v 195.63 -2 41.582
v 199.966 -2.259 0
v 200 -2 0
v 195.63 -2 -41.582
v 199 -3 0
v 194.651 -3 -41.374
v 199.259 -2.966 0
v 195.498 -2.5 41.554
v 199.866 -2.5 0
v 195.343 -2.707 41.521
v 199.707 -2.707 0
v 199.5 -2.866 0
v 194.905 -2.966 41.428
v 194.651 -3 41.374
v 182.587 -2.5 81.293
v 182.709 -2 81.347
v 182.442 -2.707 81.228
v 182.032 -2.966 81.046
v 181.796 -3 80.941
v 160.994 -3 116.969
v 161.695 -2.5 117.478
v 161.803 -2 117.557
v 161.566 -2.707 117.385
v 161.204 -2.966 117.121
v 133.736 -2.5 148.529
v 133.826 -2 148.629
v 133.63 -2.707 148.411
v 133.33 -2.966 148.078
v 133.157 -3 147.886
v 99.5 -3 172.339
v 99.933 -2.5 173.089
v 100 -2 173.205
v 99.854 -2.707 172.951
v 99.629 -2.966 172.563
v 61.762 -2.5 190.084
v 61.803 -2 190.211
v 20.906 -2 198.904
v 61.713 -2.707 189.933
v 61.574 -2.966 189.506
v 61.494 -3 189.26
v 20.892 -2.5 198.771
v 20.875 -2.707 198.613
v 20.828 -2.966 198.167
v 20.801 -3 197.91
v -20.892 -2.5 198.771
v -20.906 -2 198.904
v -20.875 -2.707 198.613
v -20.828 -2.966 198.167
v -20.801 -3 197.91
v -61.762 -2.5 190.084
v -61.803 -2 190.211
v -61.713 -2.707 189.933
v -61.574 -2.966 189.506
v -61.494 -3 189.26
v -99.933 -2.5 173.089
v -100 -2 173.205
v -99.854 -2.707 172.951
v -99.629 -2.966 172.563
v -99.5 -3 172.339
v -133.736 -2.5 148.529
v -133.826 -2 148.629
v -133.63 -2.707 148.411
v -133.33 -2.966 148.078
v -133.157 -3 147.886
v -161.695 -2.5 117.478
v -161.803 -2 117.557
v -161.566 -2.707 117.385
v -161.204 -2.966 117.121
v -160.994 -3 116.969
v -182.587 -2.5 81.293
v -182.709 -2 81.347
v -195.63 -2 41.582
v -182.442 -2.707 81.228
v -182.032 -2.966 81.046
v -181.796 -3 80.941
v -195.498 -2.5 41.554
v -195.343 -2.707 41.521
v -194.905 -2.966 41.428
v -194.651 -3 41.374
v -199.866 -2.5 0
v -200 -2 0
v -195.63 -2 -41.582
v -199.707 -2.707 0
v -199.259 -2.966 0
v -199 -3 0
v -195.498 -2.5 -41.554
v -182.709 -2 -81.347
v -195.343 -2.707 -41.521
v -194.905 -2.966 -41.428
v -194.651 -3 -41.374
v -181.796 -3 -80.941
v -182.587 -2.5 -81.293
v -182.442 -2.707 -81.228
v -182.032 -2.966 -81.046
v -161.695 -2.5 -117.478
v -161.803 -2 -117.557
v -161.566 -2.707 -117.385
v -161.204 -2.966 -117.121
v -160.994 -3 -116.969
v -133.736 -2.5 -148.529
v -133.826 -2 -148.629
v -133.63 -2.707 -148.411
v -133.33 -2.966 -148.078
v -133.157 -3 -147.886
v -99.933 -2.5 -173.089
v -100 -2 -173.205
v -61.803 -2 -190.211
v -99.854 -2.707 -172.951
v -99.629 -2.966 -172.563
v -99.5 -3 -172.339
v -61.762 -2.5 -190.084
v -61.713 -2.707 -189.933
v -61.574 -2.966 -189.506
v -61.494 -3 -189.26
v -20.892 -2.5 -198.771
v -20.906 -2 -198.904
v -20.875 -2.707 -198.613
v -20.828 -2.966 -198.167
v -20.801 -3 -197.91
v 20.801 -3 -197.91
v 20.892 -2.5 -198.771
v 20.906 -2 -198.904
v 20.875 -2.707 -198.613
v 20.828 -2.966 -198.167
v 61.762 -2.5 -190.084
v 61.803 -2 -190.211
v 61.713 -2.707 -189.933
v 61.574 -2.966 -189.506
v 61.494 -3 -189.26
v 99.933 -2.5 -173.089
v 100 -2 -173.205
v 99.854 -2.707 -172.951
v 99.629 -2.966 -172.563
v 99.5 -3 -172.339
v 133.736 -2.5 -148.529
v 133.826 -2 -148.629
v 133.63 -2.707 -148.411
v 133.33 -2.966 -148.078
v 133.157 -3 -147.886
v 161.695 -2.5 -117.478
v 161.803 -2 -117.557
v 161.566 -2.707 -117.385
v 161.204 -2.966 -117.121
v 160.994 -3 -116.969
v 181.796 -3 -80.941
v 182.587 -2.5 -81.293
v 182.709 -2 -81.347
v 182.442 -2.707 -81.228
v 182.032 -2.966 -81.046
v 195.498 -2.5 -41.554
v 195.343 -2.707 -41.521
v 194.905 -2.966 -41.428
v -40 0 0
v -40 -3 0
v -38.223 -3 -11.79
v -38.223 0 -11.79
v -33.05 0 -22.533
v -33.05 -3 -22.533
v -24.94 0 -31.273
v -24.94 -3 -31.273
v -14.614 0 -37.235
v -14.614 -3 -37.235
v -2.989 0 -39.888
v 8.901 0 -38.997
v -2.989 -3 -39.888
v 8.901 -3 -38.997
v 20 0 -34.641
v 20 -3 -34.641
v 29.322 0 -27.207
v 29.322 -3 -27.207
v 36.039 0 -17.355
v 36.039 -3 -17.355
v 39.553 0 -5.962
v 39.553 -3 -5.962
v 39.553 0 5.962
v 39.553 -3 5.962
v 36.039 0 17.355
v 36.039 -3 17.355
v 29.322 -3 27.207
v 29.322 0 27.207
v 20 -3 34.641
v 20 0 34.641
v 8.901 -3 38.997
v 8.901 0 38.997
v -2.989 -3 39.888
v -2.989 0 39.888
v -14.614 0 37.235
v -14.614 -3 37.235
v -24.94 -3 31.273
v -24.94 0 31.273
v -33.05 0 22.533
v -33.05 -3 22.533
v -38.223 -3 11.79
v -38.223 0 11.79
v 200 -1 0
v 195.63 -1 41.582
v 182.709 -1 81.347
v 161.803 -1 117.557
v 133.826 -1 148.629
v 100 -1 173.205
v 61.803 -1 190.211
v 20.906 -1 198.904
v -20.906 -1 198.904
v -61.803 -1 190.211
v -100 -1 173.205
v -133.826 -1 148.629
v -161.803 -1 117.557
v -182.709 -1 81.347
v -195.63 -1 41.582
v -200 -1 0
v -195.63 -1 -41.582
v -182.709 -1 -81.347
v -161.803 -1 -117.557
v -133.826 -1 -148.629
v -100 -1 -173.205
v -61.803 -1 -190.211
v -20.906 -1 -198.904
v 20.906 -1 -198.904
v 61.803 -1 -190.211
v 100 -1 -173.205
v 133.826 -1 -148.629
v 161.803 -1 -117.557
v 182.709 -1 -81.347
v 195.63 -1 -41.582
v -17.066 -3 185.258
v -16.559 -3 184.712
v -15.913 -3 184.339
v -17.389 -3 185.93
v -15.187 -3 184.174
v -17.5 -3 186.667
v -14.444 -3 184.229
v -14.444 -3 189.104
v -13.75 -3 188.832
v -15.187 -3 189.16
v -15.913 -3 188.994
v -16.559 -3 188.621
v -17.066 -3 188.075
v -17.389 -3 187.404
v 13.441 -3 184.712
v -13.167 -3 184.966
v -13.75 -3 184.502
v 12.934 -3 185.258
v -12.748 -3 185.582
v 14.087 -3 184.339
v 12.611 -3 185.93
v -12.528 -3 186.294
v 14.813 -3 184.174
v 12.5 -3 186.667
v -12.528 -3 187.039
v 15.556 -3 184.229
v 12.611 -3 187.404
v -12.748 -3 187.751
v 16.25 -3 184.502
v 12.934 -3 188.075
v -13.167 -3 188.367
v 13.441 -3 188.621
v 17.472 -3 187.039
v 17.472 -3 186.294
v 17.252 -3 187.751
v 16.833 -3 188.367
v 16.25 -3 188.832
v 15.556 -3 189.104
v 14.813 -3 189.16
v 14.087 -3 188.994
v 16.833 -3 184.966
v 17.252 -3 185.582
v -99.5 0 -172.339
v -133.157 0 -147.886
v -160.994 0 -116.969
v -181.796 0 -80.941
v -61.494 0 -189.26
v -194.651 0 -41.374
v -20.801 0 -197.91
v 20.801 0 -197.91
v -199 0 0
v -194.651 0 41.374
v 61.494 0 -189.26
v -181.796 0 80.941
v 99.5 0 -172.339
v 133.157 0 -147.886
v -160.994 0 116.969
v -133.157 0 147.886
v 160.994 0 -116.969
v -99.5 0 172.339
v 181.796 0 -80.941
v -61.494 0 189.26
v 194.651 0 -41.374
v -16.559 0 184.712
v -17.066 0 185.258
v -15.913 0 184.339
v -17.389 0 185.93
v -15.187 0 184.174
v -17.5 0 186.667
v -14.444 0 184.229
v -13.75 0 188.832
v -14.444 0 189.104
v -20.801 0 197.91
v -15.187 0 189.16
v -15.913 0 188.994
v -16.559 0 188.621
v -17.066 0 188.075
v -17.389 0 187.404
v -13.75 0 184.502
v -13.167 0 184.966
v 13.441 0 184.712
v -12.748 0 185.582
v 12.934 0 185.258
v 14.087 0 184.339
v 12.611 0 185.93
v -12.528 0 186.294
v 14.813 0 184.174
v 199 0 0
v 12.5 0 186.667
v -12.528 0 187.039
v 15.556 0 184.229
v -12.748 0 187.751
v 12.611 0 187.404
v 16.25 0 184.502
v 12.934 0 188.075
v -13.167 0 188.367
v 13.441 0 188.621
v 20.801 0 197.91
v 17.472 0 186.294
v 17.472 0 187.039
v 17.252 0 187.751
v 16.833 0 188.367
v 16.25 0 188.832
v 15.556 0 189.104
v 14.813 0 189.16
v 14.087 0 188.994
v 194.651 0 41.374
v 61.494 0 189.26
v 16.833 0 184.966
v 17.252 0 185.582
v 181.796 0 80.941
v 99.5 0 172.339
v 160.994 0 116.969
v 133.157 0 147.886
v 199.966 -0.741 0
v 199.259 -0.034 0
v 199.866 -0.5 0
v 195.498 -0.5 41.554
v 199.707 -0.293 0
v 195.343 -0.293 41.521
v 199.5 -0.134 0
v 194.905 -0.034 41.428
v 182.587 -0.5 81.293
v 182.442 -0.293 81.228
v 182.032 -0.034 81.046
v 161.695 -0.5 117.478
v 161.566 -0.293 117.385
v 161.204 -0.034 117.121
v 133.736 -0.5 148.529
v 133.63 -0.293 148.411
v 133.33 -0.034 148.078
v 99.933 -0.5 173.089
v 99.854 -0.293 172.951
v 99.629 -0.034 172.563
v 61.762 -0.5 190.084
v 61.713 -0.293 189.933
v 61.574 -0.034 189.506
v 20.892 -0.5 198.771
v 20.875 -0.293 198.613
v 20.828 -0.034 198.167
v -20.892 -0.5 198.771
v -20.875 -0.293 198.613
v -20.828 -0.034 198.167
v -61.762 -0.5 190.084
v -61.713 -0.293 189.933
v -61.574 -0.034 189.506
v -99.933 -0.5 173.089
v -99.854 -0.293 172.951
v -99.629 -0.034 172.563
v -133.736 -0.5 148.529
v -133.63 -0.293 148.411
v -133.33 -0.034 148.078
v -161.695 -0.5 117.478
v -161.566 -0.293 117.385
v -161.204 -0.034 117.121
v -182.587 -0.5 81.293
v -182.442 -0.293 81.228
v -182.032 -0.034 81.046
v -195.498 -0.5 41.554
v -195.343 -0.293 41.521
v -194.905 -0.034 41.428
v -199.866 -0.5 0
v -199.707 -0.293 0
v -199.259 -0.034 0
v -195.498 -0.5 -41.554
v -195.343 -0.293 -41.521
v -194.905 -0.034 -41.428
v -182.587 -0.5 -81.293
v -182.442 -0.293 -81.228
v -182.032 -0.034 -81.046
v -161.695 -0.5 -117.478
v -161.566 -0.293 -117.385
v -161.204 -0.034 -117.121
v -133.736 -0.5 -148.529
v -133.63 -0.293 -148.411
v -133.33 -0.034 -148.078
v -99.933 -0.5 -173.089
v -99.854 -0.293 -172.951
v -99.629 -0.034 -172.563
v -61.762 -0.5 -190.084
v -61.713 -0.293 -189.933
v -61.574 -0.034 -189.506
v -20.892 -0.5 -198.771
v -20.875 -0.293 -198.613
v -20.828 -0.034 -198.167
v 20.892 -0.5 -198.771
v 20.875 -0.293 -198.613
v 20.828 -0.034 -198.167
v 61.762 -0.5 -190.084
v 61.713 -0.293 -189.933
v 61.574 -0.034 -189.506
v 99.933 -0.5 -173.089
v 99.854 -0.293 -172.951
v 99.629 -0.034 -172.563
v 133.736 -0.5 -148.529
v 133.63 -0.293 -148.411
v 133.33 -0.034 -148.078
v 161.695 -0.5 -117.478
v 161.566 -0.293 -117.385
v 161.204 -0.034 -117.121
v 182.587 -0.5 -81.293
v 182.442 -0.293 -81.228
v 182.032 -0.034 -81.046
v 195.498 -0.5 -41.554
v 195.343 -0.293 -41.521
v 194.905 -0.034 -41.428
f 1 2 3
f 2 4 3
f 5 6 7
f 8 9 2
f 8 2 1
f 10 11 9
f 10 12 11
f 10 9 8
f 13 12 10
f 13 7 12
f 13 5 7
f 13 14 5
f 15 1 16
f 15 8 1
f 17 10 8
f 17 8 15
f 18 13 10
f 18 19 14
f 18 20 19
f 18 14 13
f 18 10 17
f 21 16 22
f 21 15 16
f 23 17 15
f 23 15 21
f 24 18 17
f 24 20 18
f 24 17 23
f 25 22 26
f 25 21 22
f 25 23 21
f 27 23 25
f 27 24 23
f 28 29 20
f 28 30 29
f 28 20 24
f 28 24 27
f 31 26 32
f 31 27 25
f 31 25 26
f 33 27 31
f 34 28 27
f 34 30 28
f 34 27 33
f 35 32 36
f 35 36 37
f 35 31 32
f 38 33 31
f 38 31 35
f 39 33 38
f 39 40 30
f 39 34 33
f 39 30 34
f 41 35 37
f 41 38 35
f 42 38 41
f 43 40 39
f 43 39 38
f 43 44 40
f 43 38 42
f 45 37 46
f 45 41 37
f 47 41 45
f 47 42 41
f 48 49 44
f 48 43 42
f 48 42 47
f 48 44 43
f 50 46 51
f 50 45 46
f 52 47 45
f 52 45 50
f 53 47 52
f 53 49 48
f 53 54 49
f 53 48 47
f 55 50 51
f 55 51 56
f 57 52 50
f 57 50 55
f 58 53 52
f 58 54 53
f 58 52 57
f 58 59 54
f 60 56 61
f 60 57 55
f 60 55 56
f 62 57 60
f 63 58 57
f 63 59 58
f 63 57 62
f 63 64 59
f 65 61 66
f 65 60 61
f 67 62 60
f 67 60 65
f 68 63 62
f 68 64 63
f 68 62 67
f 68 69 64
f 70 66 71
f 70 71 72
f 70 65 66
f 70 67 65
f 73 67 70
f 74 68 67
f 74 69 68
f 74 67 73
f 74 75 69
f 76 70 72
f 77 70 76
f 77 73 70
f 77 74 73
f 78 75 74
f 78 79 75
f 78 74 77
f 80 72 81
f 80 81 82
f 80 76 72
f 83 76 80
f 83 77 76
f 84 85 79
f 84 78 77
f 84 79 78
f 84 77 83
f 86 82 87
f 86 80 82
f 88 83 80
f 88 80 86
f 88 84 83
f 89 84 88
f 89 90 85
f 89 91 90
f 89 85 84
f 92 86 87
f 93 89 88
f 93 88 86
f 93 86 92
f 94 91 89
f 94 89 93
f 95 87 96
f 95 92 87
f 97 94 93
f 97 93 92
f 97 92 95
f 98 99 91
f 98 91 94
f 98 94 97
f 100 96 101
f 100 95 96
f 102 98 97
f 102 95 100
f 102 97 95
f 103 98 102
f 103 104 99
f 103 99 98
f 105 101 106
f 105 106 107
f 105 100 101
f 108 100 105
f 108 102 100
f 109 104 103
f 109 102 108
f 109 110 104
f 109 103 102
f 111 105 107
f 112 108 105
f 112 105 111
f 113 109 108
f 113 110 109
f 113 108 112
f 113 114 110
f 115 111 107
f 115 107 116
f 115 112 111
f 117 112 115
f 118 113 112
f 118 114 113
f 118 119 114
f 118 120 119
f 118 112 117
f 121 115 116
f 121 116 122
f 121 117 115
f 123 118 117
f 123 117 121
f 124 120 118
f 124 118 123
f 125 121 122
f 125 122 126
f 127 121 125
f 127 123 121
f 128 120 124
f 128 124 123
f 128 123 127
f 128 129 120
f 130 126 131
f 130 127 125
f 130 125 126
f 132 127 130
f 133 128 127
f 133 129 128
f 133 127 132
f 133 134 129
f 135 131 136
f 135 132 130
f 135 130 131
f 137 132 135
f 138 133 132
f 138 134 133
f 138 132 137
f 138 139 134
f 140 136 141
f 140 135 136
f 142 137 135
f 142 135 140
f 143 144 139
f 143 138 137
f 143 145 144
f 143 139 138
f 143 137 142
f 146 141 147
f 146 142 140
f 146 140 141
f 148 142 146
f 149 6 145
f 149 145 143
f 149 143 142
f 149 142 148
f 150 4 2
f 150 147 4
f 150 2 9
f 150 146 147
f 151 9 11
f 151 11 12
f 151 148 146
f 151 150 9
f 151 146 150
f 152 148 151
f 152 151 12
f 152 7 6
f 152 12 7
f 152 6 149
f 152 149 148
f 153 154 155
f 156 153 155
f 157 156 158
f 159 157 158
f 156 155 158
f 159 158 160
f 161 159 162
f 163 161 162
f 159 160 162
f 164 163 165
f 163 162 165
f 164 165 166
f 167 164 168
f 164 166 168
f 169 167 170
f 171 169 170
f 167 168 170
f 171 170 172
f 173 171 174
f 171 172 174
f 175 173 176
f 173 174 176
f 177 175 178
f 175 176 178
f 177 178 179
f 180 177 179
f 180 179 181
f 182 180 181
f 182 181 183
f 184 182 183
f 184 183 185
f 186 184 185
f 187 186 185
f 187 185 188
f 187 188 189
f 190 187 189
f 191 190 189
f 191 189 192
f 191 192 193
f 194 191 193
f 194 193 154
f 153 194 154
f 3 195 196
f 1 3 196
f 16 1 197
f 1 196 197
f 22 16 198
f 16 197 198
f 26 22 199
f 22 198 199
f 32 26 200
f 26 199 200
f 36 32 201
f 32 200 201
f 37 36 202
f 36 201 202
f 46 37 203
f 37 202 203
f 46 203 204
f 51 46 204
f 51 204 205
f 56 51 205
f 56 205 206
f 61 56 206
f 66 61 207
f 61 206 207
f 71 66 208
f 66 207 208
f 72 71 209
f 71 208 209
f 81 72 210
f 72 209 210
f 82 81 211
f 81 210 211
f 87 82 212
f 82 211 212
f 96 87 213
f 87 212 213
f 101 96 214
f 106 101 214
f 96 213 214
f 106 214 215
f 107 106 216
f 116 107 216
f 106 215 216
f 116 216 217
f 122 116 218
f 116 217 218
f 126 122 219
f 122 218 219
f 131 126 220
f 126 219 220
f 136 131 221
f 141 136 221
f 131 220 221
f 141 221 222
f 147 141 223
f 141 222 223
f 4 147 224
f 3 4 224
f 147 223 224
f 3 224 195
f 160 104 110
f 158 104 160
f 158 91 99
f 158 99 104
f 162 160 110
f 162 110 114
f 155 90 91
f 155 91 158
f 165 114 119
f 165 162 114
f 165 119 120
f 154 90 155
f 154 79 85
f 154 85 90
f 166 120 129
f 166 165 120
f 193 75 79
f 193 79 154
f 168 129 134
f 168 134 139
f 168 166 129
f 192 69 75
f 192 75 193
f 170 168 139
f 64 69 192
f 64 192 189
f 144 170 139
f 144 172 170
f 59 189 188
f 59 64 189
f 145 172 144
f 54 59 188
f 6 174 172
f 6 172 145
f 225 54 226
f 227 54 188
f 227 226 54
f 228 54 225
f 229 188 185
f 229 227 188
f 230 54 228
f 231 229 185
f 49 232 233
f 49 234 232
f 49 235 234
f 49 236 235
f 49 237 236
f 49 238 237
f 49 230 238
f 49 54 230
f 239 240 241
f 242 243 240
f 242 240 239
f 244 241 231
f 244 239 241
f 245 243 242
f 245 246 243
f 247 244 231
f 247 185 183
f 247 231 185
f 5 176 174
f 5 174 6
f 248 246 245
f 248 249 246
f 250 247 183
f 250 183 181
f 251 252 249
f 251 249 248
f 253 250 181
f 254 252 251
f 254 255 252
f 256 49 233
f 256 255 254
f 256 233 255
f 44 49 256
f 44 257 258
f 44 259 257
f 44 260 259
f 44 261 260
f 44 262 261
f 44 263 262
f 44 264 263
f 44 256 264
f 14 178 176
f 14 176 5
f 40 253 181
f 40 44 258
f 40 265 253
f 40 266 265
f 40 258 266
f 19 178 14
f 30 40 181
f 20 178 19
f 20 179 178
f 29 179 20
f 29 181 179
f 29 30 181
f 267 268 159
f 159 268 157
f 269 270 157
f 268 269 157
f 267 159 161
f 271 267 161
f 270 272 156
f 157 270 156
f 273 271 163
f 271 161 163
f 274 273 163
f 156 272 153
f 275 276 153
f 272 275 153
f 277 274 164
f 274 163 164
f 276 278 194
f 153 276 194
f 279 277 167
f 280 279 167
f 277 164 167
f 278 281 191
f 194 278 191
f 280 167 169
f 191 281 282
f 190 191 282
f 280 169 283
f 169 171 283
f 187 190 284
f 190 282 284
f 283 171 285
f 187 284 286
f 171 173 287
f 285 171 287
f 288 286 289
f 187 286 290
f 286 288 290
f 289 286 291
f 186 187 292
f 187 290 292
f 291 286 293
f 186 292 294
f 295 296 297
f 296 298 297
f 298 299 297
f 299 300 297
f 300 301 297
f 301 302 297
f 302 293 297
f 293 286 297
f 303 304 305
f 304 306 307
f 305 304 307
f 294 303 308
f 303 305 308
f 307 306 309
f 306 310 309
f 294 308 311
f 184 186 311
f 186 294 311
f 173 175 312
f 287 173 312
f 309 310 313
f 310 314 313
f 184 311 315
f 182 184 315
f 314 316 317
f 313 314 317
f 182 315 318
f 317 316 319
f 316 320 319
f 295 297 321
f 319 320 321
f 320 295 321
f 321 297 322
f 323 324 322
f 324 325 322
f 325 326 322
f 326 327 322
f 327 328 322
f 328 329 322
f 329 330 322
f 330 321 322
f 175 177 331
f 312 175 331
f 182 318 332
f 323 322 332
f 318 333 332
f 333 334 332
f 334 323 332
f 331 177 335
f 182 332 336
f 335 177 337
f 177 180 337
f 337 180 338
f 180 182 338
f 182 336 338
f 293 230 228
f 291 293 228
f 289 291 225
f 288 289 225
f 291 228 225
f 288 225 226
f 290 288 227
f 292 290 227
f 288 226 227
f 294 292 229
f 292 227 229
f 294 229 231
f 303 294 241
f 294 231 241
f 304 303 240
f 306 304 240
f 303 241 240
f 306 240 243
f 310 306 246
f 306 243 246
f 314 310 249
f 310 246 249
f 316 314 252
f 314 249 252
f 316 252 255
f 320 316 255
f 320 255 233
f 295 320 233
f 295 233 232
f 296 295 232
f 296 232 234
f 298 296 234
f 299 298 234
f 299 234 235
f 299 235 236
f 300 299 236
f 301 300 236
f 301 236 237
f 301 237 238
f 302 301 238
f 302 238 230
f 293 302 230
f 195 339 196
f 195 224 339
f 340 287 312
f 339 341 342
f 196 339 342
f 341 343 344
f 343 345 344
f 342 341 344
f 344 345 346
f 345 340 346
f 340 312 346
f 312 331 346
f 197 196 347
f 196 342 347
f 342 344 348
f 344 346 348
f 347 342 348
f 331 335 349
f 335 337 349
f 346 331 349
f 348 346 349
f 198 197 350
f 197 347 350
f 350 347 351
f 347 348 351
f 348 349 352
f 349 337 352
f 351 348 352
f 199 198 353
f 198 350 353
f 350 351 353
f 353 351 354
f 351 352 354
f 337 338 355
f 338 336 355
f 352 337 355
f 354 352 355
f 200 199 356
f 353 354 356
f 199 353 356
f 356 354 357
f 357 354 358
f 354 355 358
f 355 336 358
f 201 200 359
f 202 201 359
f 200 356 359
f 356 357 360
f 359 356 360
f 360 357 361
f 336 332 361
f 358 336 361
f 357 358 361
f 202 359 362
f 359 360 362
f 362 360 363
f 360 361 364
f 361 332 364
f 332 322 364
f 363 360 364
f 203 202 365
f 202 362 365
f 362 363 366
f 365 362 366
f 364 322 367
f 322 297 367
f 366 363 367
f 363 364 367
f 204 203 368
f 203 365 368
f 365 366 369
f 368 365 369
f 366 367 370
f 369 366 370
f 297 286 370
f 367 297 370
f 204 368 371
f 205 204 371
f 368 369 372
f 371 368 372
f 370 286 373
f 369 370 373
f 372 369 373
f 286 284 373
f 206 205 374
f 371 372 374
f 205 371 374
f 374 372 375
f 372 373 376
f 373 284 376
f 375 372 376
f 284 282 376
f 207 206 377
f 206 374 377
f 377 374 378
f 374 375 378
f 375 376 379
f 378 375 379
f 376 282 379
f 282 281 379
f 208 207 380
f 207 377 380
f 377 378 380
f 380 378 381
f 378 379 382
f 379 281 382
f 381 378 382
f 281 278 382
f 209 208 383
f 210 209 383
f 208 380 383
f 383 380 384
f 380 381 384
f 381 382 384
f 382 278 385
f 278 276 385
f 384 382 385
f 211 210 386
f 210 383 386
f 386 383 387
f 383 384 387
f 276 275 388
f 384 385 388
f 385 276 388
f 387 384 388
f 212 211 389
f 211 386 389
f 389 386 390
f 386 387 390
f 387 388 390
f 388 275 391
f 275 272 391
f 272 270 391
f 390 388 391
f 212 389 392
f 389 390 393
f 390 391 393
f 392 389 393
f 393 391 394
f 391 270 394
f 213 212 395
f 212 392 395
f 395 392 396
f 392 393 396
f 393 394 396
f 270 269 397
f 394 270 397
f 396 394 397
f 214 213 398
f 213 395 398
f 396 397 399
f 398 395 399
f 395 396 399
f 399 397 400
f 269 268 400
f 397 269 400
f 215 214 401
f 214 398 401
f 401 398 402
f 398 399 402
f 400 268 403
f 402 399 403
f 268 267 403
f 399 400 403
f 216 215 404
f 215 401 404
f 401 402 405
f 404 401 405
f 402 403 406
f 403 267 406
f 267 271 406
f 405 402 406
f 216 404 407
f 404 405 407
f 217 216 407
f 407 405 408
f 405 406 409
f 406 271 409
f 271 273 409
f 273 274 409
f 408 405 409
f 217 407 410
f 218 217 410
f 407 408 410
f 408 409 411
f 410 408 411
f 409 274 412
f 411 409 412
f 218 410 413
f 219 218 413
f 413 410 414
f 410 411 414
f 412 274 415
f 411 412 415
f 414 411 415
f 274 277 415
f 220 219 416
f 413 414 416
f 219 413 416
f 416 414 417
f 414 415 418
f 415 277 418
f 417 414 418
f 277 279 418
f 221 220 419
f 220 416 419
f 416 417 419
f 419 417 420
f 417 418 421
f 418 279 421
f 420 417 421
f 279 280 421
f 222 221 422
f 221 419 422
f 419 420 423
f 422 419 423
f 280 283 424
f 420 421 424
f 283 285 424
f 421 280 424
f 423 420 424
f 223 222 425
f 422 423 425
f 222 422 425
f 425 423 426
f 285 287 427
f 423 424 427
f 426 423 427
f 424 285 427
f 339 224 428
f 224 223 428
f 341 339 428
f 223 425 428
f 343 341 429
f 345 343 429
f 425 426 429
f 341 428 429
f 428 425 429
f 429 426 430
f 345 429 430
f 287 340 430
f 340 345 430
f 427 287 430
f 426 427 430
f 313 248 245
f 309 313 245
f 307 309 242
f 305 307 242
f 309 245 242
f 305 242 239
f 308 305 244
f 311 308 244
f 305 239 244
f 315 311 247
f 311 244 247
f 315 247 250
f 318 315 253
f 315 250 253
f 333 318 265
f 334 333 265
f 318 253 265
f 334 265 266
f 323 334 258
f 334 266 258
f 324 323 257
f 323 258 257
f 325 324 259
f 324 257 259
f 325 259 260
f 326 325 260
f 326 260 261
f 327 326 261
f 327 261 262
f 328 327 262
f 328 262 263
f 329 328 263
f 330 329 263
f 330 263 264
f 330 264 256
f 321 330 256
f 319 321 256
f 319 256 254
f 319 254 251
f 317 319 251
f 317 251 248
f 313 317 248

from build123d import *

# Parameters (mm, degrees)
F0_R     = 200
F1_DEPTH = 3
F2_D     = 5
F2_DEPTH = 60
F2_TIP   = 1.5021515476
F3_R     = 1
F4_D     = 80
F4_DEPTH = 60
F4_TIP   = 24.0344247611


with BuildPart() as f1:
    # F0 (on Front) → F1 (new body)
    with BuildSketch(Plane.XZ):
        Circle(F0_R)
    extrude(amount=F1_DEPTH)

    # F2
    with Locations(Plane(origin=(0, 0, 0), x_dir=(1, 0, 0), z_dir=(0, 1, 0))):
        with Locations((-15, -186.6666666667), (15, -186.6666666667)):
            Hole(F2_D / 2, depth=F2_DEPTH)
            with Locations((0, 0, -(F2_DEPTH + F2_TIP / 2))):  # 118° drill point
                Cone(0, F2_D / 2, F2_TIP, mode=Mode.SUBTRACT)

    # F3
    f3_edges = [f1.edges().sort_by_distance(p)[0] for p in [
        (-200, -3, 0),
        (-200, 0, 0),
    ]]
    fillet(f3_edges, radius=F3_R)

    # F4
    with Locations(Plane(origin=(0, 0, 0), x_dir=(1, 0, 0), z_dir=(0, 1, 0))):
        with Locations((0, 0)):
            Hole(F4_D / 2, depth=F4_DEPTH)
            with Locations((0, 0, -(F4_DEPTH + F4_TIP / 2))):  # 118° drill point
                Cone(0, F4_D / 2, F4_TIP, mode=Mode.SUBTRACT)


solid = f1.part
